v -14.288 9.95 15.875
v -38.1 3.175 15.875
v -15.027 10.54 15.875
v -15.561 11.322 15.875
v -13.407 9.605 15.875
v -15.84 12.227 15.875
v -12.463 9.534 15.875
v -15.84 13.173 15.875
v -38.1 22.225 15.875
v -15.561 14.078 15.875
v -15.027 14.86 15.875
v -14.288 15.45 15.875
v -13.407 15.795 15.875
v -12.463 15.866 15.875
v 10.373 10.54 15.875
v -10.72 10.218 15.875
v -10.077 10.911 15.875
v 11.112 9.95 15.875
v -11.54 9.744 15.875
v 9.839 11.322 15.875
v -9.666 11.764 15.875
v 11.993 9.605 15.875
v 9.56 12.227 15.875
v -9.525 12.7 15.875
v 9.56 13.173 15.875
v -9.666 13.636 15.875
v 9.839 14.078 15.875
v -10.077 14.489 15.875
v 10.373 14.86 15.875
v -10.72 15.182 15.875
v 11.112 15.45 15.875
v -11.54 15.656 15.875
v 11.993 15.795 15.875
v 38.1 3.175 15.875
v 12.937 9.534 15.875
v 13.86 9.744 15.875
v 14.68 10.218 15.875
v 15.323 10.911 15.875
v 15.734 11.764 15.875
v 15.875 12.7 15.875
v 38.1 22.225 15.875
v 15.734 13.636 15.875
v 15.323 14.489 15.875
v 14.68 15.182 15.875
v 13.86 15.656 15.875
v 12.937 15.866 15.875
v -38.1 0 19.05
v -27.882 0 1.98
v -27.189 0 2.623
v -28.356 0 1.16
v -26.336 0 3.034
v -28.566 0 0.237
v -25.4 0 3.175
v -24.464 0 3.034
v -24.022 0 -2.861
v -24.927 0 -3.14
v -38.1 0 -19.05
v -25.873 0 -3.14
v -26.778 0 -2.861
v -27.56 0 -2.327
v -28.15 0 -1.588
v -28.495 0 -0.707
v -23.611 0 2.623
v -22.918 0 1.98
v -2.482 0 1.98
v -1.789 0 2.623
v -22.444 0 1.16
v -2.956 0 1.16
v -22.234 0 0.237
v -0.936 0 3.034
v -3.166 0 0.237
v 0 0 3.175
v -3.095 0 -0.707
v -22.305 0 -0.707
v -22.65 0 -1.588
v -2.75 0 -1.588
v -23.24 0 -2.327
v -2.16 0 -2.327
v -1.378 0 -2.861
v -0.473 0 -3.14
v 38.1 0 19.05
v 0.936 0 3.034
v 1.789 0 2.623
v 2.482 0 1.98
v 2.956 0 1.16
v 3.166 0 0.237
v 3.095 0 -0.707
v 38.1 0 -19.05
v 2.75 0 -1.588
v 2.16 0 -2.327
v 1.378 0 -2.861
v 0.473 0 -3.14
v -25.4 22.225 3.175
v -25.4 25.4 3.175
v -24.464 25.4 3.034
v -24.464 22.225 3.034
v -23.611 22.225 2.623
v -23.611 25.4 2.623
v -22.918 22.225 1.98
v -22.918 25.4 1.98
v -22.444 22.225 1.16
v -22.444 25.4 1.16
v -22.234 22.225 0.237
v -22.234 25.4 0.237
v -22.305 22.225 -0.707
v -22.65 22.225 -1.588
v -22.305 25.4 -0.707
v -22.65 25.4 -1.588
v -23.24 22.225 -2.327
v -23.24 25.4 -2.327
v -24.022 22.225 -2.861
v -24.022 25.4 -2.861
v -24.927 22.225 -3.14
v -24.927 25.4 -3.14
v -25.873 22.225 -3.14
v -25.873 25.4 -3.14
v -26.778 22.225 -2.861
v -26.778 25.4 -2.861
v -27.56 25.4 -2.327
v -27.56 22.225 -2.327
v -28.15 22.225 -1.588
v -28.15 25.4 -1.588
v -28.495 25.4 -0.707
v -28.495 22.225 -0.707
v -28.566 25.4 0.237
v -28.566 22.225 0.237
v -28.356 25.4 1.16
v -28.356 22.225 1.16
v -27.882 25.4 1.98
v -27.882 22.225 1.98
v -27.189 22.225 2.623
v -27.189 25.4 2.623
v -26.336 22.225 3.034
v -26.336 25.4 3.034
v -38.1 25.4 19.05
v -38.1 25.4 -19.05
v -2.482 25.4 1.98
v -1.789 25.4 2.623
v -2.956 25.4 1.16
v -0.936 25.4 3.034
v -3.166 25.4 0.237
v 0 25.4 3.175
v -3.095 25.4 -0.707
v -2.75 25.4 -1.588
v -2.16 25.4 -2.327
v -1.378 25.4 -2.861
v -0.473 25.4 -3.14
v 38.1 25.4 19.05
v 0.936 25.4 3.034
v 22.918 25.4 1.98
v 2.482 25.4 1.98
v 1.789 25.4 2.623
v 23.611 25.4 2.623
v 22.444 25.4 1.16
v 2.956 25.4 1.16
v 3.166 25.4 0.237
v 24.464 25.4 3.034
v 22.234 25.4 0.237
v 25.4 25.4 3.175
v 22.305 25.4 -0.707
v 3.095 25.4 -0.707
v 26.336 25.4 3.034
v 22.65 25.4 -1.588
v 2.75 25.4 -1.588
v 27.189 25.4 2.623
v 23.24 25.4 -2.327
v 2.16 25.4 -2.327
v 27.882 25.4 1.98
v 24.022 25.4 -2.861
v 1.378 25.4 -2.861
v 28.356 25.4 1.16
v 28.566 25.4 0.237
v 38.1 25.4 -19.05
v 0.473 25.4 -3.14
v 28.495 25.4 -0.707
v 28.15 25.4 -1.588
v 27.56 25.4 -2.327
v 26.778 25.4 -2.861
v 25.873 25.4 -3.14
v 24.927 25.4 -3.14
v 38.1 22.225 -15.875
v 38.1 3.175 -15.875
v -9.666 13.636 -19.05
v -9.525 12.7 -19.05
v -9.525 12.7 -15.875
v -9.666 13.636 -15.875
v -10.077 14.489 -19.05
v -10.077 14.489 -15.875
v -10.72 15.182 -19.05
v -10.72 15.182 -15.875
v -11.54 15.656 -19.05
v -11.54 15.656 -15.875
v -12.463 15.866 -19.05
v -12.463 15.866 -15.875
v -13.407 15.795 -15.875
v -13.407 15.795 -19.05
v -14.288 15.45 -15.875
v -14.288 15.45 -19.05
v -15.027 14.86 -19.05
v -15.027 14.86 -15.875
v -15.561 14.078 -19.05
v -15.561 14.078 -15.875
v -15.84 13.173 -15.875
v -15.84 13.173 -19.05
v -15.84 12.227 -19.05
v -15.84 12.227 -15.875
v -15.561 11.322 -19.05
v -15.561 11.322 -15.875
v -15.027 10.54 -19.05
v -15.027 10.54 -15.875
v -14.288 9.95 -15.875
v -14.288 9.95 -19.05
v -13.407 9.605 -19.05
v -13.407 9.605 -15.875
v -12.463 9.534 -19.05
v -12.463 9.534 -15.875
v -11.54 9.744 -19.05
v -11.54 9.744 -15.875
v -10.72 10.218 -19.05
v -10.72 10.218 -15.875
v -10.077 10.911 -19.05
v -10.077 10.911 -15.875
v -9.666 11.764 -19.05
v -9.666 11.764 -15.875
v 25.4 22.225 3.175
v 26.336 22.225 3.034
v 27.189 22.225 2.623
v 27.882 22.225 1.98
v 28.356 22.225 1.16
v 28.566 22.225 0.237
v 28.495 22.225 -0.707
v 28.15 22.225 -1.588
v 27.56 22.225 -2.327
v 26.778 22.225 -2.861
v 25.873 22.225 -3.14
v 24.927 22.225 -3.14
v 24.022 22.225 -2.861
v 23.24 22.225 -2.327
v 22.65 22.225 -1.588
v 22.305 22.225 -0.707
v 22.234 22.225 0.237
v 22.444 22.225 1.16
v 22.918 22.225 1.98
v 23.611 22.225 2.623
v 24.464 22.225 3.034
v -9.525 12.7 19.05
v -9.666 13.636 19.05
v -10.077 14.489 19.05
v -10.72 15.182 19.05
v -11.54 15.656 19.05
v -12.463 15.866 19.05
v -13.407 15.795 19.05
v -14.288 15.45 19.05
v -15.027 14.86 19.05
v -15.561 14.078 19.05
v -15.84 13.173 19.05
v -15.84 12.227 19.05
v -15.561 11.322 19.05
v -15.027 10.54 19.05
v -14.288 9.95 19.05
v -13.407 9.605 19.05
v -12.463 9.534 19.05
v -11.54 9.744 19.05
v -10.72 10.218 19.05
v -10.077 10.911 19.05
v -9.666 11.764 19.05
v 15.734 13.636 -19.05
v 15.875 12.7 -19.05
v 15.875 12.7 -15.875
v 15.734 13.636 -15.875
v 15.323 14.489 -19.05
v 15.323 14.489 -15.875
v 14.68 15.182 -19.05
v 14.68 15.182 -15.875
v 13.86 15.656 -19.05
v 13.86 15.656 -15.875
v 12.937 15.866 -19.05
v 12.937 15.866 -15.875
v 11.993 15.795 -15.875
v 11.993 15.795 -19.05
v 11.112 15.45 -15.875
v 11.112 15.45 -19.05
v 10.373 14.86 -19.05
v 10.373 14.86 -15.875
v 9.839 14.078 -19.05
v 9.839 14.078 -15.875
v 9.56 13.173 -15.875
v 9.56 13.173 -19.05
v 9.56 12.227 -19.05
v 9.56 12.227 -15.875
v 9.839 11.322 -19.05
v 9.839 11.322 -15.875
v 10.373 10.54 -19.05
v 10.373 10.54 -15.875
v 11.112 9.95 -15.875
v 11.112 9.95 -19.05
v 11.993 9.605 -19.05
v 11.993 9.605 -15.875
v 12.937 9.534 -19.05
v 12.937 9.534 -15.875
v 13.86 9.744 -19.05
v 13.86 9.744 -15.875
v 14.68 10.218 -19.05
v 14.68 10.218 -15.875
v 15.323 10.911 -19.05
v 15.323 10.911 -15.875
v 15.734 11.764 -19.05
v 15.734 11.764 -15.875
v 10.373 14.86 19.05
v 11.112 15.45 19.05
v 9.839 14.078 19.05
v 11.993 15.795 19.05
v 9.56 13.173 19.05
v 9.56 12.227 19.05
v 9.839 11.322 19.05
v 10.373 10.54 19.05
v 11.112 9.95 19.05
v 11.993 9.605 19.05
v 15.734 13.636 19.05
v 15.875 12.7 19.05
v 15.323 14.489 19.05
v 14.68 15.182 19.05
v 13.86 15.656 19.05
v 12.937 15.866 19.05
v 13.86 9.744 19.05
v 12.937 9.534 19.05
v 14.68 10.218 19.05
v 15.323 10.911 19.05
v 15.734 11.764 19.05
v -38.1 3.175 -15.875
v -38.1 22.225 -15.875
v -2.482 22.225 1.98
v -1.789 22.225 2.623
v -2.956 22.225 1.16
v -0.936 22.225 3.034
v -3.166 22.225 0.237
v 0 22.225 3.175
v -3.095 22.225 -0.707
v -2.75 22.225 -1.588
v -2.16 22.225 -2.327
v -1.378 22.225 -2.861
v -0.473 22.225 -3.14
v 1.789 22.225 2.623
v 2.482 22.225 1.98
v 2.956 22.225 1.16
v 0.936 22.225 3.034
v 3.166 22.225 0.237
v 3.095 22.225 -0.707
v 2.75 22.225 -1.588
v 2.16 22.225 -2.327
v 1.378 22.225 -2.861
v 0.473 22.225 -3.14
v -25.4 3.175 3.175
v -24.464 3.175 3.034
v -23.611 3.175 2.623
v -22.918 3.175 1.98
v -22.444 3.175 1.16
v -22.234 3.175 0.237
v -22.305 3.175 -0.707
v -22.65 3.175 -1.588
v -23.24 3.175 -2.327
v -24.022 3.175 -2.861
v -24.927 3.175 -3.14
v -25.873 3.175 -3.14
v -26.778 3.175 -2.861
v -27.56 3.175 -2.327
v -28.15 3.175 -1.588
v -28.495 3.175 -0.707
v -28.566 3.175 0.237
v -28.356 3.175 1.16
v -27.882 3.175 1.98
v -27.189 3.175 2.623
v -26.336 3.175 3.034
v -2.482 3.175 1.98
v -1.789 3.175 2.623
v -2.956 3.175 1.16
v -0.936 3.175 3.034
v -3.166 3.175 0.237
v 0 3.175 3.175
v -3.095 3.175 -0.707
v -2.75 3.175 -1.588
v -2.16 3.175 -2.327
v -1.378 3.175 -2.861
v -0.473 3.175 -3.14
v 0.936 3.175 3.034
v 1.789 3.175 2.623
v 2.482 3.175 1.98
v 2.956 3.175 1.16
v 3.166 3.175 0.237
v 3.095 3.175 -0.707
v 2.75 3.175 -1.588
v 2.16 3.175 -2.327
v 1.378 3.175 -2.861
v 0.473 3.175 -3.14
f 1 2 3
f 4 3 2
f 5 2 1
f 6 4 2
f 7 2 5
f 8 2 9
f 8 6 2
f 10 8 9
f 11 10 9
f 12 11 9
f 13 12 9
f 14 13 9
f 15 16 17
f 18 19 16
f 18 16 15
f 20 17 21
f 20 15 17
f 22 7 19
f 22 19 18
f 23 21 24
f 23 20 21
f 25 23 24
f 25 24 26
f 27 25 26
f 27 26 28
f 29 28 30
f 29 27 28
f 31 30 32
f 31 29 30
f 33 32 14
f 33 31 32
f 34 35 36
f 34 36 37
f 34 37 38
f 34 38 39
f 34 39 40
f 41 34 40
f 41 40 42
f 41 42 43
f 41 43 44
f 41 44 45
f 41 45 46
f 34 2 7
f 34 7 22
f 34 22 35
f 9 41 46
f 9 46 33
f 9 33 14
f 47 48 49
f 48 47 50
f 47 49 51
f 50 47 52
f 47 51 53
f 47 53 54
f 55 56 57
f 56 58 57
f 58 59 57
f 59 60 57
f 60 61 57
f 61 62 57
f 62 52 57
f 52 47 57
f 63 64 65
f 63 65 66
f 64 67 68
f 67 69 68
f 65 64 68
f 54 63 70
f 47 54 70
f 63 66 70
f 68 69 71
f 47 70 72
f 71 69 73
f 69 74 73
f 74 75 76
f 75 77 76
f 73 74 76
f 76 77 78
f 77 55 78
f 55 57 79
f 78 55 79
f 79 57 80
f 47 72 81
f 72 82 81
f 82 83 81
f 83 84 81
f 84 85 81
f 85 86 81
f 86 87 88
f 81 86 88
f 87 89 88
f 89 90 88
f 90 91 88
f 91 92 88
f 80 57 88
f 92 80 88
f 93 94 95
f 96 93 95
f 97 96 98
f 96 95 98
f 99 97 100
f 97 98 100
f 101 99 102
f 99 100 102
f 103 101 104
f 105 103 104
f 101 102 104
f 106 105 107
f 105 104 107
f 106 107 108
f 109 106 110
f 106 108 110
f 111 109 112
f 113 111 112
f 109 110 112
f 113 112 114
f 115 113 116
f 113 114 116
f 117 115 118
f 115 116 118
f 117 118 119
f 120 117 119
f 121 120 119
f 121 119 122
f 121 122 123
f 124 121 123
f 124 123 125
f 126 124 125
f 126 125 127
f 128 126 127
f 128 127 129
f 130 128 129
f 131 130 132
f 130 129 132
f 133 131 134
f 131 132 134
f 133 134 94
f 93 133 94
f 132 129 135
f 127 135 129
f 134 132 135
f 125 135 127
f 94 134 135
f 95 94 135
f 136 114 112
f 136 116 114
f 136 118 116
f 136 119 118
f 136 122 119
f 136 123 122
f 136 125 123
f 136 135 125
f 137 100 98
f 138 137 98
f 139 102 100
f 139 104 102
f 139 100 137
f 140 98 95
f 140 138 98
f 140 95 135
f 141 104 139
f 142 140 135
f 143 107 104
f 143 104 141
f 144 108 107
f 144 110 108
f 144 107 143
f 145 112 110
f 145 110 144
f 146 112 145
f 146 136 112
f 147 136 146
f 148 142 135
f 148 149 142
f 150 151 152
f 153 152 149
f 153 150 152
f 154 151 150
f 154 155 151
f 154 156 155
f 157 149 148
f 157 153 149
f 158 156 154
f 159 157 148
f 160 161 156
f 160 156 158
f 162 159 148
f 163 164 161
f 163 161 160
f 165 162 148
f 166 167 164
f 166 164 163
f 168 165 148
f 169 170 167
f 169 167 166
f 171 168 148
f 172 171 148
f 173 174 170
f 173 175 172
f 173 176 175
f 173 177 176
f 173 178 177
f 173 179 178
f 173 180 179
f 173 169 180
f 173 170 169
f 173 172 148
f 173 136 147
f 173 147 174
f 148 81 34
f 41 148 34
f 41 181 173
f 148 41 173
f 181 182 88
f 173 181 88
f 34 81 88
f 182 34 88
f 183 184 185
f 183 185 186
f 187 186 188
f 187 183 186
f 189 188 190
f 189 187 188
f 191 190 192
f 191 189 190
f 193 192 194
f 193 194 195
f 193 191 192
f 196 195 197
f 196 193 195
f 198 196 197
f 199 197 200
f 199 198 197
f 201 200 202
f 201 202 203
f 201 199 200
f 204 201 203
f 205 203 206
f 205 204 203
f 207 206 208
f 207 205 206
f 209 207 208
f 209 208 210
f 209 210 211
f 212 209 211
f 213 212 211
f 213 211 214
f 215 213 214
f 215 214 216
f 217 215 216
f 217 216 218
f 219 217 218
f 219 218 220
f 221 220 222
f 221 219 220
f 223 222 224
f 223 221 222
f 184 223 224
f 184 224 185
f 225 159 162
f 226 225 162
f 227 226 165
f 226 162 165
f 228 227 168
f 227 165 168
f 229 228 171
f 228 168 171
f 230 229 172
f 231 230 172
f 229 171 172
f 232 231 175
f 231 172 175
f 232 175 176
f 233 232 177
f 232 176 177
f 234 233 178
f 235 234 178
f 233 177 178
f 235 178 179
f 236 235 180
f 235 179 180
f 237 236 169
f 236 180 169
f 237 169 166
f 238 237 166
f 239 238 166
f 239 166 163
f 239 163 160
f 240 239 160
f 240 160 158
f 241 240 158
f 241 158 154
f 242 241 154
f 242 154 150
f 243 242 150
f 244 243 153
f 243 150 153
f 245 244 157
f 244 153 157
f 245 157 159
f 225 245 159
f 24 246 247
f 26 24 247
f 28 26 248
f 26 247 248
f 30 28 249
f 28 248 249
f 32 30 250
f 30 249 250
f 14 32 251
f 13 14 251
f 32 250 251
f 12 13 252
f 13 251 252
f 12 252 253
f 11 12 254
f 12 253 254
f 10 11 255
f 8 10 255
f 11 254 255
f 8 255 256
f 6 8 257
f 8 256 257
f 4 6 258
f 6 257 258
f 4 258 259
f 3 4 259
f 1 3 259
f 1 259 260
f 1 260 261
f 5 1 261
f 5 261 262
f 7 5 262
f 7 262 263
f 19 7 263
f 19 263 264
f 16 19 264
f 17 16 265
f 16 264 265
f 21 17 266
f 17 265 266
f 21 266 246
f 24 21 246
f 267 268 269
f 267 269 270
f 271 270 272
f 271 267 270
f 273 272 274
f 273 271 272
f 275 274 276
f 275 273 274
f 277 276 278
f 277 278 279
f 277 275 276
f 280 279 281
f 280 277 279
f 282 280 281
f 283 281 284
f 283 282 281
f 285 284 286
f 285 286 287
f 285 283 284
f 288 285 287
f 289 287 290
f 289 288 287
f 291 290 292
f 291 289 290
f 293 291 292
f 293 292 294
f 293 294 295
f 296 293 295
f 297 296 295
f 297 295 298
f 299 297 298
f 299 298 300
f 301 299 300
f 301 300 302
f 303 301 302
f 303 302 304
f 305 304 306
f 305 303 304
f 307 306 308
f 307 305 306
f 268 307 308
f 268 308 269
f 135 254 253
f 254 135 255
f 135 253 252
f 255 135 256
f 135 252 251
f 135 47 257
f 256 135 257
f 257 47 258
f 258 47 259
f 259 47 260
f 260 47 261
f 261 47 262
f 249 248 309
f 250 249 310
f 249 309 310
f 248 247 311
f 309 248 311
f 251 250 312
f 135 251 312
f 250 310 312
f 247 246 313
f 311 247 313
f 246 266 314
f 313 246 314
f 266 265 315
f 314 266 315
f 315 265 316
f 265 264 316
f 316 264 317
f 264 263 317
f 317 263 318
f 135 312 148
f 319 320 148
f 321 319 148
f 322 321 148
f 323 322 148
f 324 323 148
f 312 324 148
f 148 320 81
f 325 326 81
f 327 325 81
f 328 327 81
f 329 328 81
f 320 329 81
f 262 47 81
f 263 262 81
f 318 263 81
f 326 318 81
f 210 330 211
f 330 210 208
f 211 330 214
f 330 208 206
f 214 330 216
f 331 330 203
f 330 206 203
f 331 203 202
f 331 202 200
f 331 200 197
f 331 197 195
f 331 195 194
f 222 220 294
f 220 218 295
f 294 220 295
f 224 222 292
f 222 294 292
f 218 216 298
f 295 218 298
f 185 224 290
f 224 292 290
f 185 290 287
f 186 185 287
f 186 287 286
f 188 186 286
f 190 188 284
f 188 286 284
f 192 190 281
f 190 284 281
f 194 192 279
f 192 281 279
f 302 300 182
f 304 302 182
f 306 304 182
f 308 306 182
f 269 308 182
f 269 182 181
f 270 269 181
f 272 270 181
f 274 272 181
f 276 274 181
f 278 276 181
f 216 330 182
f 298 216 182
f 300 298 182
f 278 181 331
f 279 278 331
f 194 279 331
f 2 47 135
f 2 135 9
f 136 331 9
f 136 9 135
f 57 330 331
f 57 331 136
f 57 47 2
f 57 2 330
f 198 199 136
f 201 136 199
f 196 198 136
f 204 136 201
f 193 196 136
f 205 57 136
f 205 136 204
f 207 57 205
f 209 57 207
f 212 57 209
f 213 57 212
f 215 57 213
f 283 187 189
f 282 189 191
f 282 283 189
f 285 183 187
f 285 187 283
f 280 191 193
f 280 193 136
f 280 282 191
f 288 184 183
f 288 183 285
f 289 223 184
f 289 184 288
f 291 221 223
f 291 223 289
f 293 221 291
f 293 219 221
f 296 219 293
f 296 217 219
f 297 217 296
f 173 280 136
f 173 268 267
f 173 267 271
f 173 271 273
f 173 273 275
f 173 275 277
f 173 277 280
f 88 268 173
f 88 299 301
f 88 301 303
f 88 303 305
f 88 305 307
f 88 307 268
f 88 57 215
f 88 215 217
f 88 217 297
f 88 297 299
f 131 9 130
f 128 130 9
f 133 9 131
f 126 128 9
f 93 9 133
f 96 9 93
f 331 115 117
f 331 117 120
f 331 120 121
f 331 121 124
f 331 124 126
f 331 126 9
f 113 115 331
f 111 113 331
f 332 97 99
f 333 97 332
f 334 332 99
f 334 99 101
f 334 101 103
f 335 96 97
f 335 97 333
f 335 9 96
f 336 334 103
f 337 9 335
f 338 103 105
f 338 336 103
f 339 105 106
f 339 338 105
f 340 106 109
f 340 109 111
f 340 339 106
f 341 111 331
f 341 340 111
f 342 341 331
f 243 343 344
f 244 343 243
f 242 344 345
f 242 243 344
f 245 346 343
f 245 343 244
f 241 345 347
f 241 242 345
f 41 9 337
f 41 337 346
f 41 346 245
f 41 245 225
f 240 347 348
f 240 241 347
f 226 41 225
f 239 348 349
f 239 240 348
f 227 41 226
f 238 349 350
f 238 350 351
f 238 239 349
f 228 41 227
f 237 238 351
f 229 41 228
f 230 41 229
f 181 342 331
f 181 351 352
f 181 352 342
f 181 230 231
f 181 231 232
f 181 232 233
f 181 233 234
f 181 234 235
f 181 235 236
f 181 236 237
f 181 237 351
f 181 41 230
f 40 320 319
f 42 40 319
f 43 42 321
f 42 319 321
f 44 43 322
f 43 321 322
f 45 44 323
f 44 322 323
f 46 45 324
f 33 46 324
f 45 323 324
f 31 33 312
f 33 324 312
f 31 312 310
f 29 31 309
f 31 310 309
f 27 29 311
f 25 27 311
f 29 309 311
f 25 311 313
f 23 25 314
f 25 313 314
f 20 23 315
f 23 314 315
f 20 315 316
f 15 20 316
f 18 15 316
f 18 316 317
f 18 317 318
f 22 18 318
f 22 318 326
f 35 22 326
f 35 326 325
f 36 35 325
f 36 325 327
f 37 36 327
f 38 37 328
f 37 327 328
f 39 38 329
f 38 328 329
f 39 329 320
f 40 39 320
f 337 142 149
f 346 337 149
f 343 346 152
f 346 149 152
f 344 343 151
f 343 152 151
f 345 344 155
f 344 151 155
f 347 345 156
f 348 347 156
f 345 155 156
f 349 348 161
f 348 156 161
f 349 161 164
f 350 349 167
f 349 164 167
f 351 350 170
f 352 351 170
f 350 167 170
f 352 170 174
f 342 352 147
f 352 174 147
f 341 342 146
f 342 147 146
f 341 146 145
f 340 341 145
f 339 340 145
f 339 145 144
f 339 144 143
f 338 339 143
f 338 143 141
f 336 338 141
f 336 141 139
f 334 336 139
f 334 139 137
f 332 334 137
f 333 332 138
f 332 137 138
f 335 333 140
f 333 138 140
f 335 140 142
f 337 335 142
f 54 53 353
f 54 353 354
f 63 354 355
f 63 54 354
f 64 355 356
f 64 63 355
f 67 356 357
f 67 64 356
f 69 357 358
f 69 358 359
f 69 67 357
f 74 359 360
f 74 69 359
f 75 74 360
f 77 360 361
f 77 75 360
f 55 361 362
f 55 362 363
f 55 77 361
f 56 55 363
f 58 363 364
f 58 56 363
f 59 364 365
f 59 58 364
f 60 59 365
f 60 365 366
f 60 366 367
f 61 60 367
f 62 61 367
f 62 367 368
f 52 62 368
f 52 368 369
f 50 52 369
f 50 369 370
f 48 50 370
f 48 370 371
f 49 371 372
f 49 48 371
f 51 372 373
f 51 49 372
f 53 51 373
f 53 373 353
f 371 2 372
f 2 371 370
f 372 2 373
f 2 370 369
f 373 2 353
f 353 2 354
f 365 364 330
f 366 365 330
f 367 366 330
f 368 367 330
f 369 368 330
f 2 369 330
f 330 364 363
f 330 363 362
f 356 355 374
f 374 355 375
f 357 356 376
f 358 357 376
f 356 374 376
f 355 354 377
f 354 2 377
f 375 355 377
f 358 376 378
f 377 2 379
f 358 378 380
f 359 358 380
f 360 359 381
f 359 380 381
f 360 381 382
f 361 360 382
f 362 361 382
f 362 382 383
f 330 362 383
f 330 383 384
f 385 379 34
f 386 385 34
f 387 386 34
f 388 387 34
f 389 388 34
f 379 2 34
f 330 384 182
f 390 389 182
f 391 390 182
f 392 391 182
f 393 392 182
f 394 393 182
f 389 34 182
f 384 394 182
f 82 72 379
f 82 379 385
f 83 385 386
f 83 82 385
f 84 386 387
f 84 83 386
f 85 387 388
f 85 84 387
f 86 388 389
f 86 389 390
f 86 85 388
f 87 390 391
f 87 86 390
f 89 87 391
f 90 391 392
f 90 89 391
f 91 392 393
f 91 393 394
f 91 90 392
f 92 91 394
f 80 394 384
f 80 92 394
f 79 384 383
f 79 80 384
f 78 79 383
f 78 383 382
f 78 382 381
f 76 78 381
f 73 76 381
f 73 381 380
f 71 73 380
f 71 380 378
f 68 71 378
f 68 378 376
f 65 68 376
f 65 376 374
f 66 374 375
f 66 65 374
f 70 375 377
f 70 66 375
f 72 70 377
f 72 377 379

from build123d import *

# Parameters (mm, degrees)
SKETCH1_W           = 76.2
SKETCH1_H           = 38.1
BOSS_EXTRUDE1_DEPTH = 25.4
SKETCH2_W           = 31.75
SKETCH2_H           = 19.05
CUT_EXTRUDE1_DEPTH  = 127
SKETCH3_R           = 3.175
CUT_EXTRUDE2_DEPTH  = 3.175
SKETCH4_R           = 3.175
CUT_EXTRUDE4_DEPTH  = 3.175
SKETCH3_5_R         = 3.175
CUT_EXTRUDE5_DEPTH  = 3.175


with BuildPart() as part:
    # Sketch1 → Boss-Extrude1 (new body)
    with BuildSketch(Plane(origin=(0, 0, 0), x_dir=(1, 0, 0), z_dir=(0, 1, 0))):
        Rectangle(SKETCH1_W, SKETCH1_H)
    extrude(amount=BOSS_EXTRUDE1_DEPTH)

    # Sketch2 → Cut-Extrude1 (cut)
    with BuildSketch(Plane(origin=(38.1, 0, 0), x_dir=(0, 0, -1), z_dir=(1, 0, 0))):
        with Locations((0, 12.7)):
            Rectangle(SKETCH2_W, SKETCH2_H)
    extrude(amount=-CUT_EXTRUDE1_DEPTH, mode=Mode.SUBTRACT)

    # Sketch3 → Cut-Extrude2 (cut)
    with BuildSketch(Plane(origin=(0, 25.4, 0), x_dir=(1, 0, 0), z_dir=(0, 1, 0))):
        with Locations((-25.4, 0)):
            Circle(SKETCH3_R)
        Circle(SKETCH3_R)
    cut_extrude2 = extrude(amount=-CUT_EXTRUDE2_DEPTH, mode=Mode.SUBTRACT)

    # Mirror1: Cut-Extrude2 across plane
    add(cut_extrude2.mirror(Plane.ZX.offset(12.7)), mode=Mode.SUBTRACT)

    # Sketch4 → Cut-Extrude4 (cut)
    with BuildSketch(Plane.XY.offset(19.05)):
        with Locations((-12.7, 12.7)):
            Circle(SKETCH4_R)
        with Locations((12.7, 12.7)):
            Circle(SKETCH4_R)
    cut_extrude4 = extrude(amount=-CUT_EXTRUDE4_DEPTH, mode=Mode.SUBTRACT)

    # Mirror3: Cut-Extrude4 across plane
    add(cut_extrude4.mirror(Plane.XY), mode=Mode.SUBTRACT)

    # Sketch3<5> → Cut-Extrude5 (cut)
    with BuildSketch(Plane(origin=(0, 25.4, 0), x_dir=(1, 0, 0), z_dir=(0, 1, 0))):
        with Locations((25.4, 0)):
            Circle(SKETCH3_5_R)
    extrude(amount=-CUT_EXTRUDE5_DEPTH, mode=Mode.SUBTRACT)


solid = part.part
